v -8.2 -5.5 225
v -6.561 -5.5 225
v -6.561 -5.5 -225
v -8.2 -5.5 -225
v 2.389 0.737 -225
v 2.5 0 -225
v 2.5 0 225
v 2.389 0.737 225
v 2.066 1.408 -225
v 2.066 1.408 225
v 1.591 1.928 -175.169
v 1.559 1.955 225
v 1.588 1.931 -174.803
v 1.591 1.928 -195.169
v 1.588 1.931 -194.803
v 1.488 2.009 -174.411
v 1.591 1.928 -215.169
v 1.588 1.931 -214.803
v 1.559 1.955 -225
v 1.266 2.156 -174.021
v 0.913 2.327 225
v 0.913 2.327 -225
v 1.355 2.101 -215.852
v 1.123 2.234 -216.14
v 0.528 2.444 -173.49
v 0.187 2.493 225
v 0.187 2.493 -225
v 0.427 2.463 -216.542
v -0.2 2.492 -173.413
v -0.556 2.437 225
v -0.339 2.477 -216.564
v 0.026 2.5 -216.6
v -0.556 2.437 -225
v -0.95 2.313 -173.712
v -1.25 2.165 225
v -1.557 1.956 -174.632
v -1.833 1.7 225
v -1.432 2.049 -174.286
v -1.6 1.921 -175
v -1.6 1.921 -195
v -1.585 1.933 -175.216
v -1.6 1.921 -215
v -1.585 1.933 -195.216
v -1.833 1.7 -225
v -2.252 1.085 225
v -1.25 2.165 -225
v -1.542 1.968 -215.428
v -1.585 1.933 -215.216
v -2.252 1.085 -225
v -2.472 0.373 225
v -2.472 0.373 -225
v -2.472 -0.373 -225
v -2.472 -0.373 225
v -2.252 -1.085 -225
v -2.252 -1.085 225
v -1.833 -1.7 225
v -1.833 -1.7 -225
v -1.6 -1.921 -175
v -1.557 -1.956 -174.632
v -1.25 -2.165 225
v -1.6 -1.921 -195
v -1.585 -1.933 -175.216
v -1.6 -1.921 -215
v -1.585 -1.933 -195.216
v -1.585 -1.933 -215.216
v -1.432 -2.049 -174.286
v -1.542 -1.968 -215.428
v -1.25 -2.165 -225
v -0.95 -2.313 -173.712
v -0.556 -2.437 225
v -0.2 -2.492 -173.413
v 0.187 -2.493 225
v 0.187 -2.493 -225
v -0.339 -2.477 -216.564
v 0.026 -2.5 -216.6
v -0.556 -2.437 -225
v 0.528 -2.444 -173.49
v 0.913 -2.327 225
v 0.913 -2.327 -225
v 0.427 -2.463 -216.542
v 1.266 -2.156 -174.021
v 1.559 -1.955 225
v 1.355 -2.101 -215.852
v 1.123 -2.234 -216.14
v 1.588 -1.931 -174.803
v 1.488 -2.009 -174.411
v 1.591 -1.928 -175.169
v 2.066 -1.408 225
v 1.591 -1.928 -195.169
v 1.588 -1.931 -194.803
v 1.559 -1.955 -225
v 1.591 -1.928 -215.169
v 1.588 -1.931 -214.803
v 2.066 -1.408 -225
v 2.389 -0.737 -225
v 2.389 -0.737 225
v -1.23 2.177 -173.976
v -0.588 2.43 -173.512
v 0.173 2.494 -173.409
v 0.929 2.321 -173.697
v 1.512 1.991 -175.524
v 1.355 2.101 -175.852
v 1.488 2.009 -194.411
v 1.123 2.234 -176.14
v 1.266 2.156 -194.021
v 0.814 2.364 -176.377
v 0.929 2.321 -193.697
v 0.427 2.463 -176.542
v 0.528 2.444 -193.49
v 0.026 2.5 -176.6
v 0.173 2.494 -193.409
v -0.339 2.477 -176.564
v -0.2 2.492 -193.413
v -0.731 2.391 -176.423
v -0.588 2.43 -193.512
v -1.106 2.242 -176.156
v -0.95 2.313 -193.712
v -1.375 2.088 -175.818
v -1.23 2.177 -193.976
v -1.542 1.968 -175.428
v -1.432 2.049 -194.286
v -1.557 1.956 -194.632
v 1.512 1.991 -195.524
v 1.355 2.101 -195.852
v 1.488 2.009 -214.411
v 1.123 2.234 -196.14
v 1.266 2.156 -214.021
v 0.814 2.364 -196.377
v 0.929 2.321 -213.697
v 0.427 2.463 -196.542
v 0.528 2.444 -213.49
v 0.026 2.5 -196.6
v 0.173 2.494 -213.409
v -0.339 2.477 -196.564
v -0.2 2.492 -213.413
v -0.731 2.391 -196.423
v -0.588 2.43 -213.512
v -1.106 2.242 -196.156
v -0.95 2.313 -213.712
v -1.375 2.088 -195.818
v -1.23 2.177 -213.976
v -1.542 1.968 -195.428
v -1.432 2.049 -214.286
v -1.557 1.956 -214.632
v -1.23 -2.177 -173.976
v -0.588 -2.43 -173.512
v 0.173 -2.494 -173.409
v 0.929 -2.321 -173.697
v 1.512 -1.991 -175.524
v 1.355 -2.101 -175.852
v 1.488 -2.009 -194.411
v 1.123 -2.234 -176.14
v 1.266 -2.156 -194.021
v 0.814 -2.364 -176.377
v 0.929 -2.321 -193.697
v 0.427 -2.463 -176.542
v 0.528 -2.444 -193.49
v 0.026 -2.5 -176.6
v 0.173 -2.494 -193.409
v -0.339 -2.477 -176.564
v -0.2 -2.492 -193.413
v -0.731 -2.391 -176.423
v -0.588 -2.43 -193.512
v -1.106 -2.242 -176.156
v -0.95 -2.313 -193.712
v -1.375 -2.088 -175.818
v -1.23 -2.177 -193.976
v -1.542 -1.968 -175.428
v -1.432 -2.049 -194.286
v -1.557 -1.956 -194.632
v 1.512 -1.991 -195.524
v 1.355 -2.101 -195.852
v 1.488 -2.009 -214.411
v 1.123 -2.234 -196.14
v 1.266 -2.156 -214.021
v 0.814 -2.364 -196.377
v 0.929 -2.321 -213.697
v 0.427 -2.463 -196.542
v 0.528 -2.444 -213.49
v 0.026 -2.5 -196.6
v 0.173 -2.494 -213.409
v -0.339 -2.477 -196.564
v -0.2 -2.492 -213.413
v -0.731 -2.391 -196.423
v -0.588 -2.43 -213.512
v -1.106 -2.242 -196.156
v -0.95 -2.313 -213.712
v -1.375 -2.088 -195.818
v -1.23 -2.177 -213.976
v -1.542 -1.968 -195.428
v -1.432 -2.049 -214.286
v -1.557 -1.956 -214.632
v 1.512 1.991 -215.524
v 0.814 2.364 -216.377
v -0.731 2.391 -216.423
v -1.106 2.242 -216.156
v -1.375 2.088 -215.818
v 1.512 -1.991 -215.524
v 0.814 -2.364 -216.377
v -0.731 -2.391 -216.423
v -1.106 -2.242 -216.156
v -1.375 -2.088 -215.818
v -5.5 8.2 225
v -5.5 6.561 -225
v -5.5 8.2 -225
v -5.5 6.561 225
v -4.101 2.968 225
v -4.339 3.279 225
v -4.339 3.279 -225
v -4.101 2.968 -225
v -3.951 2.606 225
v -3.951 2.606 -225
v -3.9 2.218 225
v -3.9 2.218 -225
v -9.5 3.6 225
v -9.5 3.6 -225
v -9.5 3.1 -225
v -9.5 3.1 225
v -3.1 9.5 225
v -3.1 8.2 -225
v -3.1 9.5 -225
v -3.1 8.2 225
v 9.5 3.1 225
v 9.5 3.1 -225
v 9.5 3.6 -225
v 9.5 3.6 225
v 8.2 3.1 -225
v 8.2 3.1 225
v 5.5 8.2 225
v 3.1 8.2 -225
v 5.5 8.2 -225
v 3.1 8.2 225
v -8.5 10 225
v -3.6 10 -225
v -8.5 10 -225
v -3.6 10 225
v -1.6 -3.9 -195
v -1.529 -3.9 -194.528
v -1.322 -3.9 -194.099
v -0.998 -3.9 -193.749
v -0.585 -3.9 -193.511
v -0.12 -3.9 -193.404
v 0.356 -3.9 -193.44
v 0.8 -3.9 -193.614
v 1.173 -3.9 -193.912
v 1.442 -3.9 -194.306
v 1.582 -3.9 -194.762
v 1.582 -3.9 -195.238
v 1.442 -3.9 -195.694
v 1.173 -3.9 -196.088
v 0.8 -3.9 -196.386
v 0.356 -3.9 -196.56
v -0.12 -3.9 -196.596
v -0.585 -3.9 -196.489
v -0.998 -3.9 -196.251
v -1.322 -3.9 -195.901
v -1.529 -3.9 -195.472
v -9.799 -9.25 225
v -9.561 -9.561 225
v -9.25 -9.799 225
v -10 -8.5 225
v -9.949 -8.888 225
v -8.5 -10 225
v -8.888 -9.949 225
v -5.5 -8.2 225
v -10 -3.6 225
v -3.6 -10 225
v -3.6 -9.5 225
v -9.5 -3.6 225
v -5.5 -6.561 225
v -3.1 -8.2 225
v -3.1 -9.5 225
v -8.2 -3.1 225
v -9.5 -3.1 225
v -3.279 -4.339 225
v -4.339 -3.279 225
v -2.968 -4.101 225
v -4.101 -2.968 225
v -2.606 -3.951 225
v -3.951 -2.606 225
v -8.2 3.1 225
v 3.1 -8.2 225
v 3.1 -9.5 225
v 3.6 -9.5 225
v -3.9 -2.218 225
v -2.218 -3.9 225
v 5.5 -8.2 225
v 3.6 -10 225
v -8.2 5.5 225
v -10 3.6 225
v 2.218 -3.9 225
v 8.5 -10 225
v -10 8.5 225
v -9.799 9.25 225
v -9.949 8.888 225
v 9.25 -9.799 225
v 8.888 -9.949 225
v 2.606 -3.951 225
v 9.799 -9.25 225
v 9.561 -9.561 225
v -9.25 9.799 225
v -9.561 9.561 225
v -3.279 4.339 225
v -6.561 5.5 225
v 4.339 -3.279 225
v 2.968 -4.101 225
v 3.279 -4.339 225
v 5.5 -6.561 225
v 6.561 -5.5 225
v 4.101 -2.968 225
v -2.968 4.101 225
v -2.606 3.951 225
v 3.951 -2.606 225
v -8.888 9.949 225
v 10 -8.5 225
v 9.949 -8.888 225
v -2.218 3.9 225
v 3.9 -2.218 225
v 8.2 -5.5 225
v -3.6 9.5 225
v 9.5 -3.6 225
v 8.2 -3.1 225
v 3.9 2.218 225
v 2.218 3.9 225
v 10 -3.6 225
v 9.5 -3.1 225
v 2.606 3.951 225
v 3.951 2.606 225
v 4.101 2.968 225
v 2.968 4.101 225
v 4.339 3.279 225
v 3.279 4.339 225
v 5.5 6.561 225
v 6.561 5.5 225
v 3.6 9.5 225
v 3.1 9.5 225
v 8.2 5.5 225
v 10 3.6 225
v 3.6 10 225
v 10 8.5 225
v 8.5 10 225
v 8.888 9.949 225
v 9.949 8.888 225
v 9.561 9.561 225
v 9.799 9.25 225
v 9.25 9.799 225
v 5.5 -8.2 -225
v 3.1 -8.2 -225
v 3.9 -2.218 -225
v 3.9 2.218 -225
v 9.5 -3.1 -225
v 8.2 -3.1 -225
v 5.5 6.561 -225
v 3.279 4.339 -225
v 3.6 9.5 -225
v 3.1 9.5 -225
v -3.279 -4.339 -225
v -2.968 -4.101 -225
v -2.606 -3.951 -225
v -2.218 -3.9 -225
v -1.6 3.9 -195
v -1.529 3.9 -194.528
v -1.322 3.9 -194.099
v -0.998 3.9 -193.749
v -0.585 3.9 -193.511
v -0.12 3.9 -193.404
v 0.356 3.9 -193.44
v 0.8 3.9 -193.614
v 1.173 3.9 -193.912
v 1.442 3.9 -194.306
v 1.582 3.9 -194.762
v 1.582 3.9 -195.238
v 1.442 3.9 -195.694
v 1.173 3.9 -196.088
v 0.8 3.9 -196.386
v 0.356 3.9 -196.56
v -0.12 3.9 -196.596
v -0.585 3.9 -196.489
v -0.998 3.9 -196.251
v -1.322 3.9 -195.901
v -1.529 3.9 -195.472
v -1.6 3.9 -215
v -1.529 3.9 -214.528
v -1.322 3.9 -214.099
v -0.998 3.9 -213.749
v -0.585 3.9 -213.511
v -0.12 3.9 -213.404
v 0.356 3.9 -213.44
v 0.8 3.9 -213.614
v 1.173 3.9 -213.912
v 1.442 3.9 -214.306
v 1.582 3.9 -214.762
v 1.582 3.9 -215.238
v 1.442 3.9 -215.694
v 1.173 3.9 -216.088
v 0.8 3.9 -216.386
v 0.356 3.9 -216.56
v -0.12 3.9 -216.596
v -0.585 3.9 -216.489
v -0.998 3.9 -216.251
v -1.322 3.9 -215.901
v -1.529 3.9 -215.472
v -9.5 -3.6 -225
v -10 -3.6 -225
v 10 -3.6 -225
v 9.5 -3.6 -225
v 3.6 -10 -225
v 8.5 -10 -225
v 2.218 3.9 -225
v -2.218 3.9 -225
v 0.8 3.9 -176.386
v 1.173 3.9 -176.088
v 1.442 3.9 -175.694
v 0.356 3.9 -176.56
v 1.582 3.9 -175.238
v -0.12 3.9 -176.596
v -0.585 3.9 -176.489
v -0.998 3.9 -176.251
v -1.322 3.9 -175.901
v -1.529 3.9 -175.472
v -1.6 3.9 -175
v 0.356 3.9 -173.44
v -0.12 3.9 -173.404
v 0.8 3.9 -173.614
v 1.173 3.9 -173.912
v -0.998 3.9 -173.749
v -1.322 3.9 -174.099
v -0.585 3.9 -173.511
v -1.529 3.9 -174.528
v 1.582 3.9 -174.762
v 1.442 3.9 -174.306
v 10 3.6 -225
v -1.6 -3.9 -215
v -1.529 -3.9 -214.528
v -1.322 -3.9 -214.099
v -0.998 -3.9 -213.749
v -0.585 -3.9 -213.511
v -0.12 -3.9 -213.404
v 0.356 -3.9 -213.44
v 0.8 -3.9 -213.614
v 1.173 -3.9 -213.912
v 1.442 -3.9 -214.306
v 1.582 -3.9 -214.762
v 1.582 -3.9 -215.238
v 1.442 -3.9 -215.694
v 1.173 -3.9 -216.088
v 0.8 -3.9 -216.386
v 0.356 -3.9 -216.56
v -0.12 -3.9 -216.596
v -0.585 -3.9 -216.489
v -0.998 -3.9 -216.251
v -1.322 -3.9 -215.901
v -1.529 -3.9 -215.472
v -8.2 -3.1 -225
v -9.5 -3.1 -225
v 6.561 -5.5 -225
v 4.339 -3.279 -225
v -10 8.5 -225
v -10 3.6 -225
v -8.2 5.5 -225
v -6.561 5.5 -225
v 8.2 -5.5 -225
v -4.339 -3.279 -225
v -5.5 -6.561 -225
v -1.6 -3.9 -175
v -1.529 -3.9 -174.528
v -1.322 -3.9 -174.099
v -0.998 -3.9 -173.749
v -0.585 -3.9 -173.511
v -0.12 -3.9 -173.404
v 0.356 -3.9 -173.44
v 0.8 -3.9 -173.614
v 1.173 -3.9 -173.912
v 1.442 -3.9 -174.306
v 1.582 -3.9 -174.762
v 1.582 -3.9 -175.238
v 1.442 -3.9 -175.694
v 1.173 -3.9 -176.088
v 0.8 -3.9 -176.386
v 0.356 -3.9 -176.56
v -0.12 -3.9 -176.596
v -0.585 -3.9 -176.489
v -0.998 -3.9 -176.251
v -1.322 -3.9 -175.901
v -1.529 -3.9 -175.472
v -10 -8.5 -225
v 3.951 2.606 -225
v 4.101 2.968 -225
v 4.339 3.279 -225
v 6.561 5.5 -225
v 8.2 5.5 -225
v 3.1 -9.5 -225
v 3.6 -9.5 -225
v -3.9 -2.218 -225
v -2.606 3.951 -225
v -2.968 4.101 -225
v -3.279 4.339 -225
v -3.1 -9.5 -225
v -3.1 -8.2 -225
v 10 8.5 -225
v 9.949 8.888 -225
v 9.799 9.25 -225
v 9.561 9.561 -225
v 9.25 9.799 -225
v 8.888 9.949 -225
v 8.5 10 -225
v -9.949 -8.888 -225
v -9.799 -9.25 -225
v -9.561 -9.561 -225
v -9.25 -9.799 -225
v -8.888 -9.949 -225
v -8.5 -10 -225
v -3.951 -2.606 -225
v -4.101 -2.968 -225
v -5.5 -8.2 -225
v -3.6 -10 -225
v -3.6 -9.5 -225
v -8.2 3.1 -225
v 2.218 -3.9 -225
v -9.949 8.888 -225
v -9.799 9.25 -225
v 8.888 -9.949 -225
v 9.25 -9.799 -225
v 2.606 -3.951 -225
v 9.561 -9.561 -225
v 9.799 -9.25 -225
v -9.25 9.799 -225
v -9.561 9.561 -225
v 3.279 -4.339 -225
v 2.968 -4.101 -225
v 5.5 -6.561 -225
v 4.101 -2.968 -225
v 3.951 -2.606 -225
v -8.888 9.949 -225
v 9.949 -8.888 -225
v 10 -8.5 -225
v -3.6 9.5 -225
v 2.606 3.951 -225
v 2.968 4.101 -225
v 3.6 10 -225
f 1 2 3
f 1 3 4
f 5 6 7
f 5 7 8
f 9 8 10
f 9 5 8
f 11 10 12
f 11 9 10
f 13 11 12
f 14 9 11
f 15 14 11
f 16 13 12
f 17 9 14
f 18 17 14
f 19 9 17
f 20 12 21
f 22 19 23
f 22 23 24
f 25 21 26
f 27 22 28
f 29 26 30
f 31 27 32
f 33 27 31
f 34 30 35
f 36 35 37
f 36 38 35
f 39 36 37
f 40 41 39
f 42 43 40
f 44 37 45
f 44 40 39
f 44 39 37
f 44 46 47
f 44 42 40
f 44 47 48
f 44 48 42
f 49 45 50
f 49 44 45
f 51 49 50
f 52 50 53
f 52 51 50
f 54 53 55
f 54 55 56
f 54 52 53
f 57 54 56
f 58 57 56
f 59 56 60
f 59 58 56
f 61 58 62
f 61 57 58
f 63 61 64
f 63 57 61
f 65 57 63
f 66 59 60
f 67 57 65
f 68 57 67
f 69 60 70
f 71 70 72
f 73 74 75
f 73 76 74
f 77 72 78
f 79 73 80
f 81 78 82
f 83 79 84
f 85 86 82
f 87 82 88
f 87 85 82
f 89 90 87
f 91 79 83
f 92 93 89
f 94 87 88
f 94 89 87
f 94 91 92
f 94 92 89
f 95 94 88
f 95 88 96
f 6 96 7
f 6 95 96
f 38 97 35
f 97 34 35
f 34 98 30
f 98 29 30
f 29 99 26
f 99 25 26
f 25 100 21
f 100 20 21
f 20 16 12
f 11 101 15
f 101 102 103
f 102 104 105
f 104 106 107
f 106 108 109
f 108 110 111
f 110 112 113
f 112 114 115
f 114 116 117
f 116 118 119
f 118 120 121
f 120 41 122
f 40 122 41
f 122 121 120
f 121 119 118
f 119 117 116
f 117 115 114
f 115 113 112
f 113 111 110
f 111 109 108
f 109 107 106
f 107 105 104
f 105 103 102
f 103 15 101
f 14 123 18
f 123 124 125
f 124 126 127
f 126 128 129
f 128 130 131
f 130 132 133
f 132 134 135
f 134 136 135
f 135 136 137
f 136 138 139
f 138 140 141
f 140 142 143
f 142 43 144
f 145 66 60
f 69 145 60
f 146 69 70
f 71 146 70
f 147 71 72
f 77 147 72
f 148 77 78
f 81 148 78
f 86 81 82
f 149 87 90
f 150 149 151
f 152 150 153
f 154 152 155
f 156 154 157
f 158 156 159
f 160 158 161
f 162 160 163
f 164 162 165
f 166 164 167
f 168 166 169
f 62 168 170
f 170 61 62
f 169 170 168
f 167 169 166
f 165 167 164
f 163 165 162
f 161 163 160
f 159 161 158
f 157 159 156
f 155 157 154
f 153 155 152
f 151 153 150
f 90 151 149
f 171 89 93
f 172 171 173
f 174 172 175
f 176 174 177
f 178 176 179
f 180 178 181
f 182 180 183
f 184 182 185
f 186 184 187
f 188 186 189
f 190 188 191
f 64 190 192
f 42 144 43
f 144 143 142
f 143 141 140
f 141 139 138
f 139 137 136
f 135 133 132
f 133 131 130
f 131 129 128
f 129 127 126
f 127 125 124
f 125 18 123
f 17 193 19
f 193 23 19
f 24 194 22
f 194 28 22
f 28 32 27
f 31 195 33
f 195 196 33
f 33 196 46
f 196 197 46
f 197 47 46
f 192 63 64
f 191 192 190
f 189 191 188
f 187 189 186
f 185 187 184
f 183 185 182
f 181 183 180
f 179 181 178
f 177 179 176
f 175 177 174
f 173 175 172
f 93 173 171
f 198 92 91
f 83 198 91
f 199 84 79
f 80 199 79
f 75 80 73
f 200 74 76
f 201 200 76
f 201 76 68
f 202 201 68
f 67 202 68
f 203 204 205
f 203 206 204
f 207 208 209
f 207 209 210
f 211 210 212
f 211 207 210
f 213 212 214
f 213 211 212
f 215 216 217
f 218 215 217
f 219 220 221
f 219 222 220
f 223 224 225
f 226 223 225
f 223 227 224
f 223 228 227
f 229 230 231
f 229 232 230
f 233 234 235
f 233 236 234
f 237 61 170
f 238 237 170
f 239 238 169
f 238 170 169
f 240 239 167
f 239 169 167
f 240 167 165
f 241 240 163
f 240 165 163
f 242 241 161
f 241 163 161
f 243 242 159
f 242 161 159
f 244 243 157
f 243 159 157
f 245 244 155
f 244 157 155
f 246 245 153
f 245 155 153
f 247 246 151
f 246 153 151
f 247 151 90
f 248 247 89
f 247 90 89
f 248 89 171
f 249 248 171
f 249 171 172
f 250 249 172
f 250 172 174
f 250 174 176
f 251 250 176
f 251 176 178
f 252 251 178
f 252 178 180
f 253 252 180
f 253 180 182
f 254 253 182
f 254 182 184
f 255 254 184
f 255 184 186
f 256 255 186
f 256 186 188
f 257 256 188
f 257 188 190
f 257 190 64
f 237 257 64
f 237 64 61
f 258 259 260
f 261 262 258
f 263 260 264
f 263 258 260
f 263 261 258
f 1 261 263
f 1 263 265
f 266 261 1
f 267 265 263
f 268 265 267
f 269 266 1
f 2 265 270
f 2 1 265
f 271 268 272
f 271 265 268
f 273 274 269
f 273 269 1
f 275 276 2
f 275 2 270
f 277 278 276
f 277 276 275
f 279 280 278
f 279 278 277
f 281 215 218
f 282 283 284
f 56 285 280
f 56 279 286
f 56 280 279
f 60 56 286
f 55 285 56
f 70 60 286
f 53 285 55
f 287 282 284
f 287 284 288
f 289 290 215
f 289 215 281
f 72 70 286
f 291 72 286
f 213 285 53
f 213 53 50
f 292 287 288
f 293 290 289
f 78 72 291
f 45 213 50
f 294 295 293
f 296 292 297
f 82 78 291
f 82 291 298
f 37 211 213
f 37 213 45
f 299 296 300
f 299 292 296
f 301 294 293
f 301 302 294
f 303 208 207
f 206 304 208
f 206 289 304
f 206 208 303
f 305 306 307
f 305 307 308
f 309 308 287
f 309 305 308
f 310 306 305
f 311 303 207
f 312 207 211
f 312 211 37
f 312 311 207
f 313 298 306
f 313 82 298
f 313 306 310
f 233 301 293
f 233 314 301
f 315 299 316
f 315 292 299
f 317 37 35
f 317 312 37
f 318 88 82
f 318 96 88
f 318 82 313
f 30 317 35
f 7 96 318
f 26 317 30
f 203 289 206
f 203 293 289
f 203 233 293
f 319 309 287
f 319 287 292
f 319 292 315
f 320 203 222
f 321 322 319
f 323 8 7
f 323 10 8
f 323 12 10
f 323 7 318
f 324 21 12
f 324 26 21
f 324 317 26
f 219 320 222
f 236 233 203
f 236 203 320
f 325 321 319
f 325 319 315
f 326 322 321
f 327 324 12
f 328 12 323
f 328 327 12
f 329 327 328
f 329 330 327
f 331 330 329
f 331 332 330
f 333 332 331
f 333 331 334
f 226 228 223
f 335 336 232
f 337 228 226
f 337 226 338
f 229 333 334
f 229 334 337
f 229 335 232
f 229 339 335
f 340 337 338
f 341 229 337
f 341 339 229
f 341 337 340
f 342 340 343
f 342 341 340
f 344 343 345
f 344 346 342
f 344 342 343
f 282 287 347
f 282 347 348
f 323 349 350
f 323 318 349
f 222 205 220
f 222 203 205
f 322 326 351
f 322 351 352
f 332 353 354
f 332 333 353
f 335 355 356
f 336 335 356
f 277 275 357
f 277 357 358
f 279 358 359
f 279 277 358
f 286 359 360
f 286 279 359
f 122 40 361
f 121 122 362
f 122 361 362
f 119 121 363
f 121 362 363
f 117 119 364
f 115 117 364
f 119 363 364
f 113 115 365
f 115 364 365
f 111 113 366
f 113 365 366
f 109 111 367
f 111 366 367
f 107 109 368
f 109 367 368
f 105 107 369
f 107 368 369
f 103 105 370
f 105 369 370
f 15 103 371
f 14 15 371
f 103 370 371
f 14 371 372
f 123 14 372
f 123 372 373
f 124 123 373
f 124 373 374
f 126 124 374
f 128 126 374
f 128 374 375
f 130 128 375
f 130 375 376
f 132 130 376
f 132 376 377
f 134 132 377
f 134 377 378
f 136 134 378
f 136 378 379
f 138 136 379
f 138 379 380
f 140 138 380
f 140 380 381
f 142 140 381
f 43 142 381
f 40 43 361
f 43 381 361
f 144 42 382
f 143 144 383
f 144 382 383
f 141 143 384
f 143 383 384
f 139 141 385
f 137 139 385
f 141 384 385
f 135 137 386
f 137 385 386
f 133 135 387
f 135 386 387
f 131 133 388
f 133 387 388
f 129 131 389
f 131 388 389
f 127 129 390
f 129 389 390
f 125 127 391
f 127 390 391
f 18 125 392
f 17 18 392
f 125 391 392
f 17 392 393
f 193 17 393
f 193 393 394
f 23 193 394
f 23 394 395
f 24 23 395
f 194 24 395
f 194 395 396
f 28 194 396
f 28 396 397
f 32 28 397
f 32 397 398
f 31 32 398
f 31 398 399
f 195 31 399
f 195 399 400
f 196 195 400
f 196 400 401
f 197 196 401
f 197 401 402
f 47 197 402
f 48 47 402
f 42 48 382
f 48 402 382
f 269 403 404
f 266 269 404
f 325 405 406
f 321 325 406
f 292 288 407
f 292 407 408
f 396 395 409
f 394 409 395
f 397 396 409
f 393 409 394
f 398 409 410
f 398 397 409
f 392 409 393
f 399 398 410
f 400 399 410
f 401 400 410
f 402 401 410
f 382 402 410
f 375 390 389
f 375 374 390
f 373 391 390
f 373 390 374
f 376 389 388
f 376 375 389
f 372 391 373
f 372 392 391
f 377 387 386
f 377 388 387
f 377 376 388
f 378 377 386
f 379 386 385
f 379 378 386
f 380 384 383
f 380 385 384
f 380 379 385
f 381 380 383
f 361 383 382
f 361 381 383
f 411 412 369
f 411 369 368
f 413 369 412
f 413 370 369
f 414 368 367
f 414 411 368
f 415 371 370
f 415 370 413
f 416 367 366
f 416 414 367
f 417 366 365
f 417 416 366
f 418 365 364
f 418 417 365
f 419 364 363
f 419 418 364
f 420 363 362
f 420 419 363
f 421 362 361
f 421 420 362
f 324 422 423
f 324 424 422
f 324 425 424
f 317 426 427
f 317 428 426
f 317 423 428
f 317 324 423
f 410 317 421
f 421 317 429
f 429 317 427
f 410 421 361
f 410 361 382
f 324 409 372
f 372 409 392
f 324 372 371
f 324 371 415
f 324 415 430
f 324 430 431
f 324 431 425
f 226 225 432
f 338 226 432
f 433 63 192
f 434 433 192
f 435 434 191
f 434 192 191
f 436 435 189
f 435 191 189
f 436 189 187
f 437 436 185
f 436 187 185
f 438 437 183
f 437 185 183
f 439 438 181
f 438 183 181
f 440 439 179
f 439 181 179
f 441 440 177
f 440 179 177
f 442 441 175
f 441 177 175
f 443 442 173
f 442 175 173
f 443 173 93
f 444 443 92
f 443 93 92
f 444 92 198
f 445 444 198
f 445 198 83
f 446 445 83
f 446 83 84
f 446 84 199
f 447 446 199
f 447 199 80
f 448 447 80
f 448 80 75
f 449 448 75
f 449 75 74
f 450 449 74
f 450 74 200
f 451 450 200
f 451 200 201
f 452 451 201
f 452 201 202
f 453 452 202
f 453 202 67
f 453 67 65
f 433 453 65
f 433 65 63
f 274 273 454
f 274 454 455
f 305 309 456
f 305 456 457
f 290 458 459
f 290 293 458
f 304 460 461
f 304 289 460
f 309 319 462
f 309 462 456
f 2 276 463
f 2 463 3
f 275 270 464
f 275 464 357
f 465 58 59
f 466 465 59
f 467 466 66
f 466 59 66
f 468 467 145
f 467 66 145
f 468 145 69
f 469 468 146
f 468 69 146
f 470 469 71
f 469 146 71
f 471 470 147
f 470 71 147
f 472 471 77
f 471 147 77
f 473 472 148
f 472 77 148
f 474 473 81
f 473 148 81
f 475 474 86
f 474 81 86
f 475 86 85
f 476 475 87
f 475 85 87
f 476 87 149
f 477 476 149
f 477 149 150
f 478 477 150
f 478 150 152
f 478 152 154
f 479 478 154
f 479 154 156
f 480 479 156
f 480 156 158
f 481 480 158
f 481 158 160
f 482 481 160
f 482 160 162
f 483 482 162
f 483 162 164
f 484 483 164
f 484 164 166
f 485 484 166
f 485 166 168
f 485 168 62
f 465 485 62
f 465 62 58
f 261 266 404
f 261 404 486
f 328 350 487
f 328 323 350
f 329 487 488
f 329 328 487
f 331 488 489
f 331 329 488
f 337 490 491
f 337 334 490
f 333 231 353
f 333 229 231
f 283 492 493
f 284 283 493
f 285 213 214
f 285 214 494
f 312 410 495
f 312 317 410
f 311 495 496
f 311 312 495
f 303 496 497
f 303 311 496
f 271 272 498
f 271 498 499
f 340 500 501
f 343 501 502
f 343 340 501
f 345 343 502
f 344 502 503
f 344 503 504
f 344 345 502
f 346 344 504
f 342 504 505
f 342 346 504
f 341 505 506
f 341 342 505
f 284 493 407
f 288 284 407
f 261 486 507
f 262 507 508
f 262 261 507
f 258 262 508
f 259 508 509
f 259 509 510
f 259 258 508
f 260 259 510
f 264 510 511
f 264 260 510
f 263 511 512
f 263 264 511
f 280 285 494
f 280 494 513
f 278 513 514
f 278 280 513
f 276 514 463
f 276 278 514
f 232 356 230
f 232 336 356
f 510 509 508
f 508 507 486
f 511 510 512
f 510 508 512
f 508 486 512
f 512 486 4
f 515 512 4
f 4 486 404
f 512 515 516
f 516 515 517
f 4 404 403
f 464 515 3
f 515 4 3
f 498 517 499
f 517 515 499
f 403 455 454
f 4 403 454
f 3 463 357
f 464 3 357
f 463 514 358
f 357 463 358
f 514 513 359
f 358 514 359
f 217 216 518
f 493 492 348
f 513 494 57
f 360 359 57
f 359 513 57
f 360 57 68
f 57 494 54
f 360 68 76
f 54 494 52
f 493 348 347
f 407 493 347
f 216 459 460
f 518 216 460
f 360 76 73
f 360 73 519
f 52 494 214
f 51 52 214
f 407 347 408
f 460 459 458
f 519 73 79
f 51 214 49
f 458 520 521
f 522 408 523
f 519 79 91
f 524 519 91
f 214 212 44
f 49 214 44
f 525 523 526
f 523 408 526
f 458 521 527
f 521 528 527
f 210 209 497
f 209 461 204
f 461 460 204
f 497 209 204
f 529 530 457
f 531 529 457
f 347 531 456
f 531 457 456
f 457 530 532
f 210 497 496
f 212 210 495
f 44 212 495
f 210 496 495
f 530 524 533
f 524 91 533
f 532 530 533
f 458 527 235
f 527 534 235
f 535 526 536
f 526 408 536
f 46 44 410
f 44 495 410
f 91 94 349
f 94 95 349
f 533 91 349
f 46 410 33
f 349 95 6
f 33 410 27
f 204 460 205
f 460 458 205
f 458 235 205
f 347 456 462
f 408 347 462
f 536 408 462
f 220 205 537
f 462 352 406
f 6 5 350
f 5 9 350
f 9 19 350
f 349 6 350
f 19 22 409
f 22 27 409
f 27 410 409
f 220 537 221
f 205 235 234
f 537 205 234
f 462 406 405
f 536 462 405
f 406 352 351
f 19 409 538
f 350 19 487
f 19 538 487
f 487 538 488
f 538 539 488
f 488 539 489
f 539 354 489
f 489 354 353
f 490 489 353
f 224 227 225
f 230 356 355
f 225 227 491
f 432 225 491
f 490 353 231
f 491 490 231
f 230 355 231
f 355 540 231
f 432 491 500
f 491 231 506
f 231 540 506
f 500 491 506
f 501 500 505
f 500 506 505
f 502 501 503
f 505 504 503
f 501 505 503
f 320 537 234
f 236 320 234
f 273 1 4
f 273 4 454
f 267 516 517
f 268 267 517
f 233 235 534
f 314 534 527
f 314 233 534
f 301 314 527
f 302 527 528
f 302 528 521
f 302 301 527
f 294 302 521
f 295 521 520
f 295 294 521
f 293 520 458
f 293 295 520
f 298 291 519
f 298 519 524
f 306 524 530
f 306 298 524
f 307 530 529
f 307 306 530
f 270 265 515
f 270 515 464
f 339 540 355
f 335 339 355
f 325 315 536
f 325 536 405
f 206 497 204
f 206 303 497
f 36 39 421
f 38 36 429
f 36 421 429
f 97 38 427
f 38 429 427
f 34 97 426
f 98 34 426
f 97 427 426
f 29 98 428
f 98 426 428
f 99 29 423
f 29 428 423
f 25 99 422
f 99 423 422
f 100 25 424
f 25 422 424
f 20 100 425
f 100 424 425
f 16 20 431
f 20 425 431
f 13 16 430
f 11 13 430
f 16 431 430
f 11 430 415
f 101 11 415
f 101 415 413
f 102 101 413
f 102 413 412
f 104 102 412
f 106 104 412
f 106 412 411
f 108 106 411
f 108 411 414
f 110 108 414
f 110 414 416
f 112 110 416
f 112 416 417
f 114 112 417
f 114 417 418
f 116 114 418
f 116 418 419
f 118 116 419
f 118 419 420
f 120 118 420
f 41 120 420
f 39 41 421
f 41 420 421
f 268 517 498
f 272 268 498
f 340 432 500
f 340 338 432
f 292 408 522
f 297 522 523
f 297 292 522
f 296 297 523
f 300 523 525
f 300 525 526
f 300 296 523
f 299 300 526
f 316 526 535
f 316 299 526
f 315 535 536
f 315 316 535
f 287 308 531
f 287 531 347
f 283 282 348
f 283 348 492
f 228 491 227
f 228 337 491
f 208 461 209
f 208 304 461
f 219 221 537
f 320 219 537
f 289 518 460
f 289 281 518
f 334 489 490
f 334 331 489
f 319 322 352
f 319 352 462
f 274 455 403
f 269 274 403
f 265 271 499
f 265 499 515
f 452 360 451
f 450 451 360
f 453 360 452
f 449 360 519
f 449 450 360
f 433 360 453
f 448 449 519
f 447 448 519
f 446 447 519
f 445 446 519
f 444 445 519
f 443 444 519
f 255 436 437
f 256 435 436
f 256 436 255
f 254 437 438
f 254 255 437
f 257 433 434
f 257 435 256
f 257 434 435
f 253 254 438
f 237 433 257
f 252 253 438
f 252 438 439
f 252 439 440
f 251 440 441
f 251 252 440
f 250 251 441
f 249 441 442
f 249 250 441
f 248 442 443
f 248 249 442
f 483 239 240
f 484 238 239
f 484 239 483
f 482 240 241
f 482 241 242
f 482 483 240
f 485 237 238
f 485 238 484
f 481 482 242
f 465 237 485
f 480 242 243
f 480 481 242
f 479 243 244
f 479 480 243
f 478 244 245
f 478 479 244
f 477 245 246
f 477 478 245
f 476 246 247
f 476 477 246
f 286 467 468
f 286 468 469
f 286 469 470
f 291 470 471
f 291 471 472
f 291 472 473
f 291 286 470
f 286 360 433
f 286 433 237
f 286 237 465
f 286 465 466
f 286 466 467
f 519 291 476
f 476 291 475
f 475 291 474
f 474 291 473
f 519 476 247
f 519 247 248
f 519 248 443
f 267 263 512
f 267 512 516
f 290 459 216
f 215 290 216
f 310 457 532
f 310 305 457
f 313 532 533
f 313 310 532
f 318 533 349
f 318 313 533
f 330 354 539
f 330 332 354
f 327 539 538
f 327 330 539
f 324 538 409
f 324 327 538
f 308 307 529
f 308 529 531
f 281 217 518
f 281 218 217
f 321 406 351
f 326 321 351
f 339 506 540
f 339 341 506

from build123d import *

# Parameters (mm, degrees)
SKETCH_1_R          = 2.5
EXTRUDE_1_DEPTH     = 225
SKETCH_2_R          = 1.6
CUT_EXTRUDE_1_DEPTH = 227.108381092


with BuildPart() as part:
    # 草图1 → 凸台-拉伸1 (new, symmetric)
    with BuildSketch(Plane.XY):
        with BuildLine():
            Line((-6.560660172, 5.5), (-4.339339828, 3.278679656))
            ThreePointArc((-4.339339828, 3.278679656), (-4.014180701, 2.792044633), (-3.9, 2.218019485))
            Line((-3.9, 2.218019485), (-3.9, -2.218019485))
            ThreePointArc((-3.9, -2.218019485), (-4.014180701, -2.792044633), (-4.339339828, -3.278679656))
            Line((-4.339339828, -3.278679656), (-6.560660172, -5.5))
            Line((-6.560660172, -5.5), (-8.2, -5.5))
            Line((-8.2, -5.5), (-8.2, -3.1))
            Line((-8.2, -3.1), (-9.5, -3.1))
            Line((-9.5, -3.1), (-9.5, -3.6))
            Line((-9.5, -3.6), (-10, -3.6))
            Line((-10, -3.6), (-10, -8.5))
            ThreePointArc((-10, -8.5), (-9.560660172, -9.560660172), (-8.5, -10))
            Line((-8.5, -10), (-3.6, -10))
            Line((-3.6, -10), (-3.6, -9.5))
            Line((-3.6, -9.5), (-3.1, -9.5))
            Line((-3.1, -9.5), (-3.1, -8.2))
            Line((-3.1, -8.2), (-5.5, -8.2))
            Line((-5.5, -8.2), (-5.5, -6.560660172))
            Line((-5.5, -6.560660172), (-3.278679656, -4.339339828))
            ThreePointArc((-3.278679656, -4.339339828), (-2.792044633, -4.014180701), (-2.218019485, -3.9))
            Line((-2.218019485, -3.9), (2.218019485, -3.9))
            ThreePointArc((2.218019485, -3.9), (2.792044633, -4.014180701), (3.278679656, -4.339339828))
            Line((3.278679656, -4.339339828), (5.5, -6.560660172))
            Line((5.5, -6.560660172), (5.5, -8.2))
            Line((5.5, -8.2), (3.1, -8.2))
            Line((3.1, -8.2), (3.1, -9.5))
            Line((3.1, -9.5), (3.6, -9.5))
            Line((3.6, -9.5), (3.6, -10))
            Line((3.6, -10), (8.5, -10))
            ThreePointArc((8.5, -10), (9.560660172, -9.560660172), (10, -8.5))
            Line((10, -8.5), (10, -3.6))
            Line((10, -3.6), (9.5, -3.6))
            Line((9.5, -3.6), (9.5, -3.1))
            Line((9.5, -3.1), (8.2, -3.1))
            Line((8.2, -3.1), (8.2, -5.5))
            Line((8.2, -5.5), (6.560660172, -5.5))
            Line((6.560660172, -5.5), (4.339339828, -3.278679656))
            ThreePointArc((4.339339828, -3.278679656), (4.014180701, -2.792044633), (3.9, -2.218019485))
            Line((3.9, -2.218019485), (3.9, 2.218019485))
            ThreePointArc((3.9, 2.218019485), (4.014180701, 2.792044633), (4.339339828, 3.278679656))
            Line((4.339339828, 3.278679656), (6.560660172, 5.5))
            Line((6.560660172, 5.5), (8.2, 5.5))
            Line((8.2, 5.5), (8.2, 3.1))
            Line((8.2, 3.1), (9.5, 3.1))
            Line((9.5, 3.1), (9.5, 3.6))
            Line((9.5, 3.6), (10, 3.6))
            Line((10, 3.6), (10, 8.5))
            ThreePointArc((10, 8.5), (9.560660172, 9.560660172), (8.5, 10))
            Line((8.5, 10), (3.6, 10))
            Line((3.6, 10), (3.6, 9.5))
            Line((3.6, 9.5), (3.1, 9.5))
            Line((3.1, 9.5), (3.1, 8.2))
            Line((3.1, 8.2), (5.5, 8.2))
            Line((5.5, 8.2), (5.5, 6.560660172))
            Line((5.5, 6.560660172), (3.278679656, 4.339339828))
            ThreePointArc((3.278679656, 4.339339828), (2.792044633, 4.014180701), (2.218019485, 3.9))
            Line((2.218019485, 3.9), (-2.218019485, 3.9))
            ThreePointArc((-2.218019485, 3.9), (-2.792044633, 4.014180701), (-3.278679656, 4.339339828))
            Line((-3.278679656, 4.339339828), (-5.5, 6.560660172))
            Line((-5.5, 6.560660172), (-5.5, 8.2))
            Line((-5.5, 8.2), (-3.1, 8.2))
            Line((-3.1, 8.2), (-3.1, 9.5))
            Line((-3.1, 9.5), (-3.6, 9.5))
            Line((-3.6, 9.5), (-3.6, 10))
            Line((-3.6, 10), (-8.5, 10))
            ThreePointArc((-8.5, 10), (-9.560660172, 9.560660172), (-10, 8.5))
            Line((-10, 8.5), (-10, 3.6))
            Line((-10, 3.6), (-9.5, 3.6))
            Line((-9.5, 3.6), (-9.5, 3.1))
            Line((-9.5, 3.1), (-8.2, 3.1))
            Line((-8.2, 3.1), (-8.2, 5.5))
            Line((-8.2, 5.5), (-6.560660172, 5.5))
        make_face()
        Circle(SKETCH_1_R, mode=Mode.SUBTRACT)
    extrude(amount=EXTRUDE_1_DEPTH, both=True)

    # 草图2 → 切除-拉伸1 (cut, through all)
    with BuildSketch(Plane(origin=(0, 10, 0), x_dir=(1, 0, 0), z_dir=(0, 1, 0))):
        with Locations(Location((0, 215, 0), (0, 0, 180))):
            Circle(SKETCH_2_R)
        with Locations(Location((0, 195, 0), (0, 0, 180))):
            Circle(SKETCH_2_R)
        with Locations(Location((0, 175, 0), (0, 0, 180))):
            Circle(SKETCH_2_R)
    extrude(amount=-CUT_EXTRUDE_1_DEPTH, mode=Mode.SUBTRACT)


solid = part.part
